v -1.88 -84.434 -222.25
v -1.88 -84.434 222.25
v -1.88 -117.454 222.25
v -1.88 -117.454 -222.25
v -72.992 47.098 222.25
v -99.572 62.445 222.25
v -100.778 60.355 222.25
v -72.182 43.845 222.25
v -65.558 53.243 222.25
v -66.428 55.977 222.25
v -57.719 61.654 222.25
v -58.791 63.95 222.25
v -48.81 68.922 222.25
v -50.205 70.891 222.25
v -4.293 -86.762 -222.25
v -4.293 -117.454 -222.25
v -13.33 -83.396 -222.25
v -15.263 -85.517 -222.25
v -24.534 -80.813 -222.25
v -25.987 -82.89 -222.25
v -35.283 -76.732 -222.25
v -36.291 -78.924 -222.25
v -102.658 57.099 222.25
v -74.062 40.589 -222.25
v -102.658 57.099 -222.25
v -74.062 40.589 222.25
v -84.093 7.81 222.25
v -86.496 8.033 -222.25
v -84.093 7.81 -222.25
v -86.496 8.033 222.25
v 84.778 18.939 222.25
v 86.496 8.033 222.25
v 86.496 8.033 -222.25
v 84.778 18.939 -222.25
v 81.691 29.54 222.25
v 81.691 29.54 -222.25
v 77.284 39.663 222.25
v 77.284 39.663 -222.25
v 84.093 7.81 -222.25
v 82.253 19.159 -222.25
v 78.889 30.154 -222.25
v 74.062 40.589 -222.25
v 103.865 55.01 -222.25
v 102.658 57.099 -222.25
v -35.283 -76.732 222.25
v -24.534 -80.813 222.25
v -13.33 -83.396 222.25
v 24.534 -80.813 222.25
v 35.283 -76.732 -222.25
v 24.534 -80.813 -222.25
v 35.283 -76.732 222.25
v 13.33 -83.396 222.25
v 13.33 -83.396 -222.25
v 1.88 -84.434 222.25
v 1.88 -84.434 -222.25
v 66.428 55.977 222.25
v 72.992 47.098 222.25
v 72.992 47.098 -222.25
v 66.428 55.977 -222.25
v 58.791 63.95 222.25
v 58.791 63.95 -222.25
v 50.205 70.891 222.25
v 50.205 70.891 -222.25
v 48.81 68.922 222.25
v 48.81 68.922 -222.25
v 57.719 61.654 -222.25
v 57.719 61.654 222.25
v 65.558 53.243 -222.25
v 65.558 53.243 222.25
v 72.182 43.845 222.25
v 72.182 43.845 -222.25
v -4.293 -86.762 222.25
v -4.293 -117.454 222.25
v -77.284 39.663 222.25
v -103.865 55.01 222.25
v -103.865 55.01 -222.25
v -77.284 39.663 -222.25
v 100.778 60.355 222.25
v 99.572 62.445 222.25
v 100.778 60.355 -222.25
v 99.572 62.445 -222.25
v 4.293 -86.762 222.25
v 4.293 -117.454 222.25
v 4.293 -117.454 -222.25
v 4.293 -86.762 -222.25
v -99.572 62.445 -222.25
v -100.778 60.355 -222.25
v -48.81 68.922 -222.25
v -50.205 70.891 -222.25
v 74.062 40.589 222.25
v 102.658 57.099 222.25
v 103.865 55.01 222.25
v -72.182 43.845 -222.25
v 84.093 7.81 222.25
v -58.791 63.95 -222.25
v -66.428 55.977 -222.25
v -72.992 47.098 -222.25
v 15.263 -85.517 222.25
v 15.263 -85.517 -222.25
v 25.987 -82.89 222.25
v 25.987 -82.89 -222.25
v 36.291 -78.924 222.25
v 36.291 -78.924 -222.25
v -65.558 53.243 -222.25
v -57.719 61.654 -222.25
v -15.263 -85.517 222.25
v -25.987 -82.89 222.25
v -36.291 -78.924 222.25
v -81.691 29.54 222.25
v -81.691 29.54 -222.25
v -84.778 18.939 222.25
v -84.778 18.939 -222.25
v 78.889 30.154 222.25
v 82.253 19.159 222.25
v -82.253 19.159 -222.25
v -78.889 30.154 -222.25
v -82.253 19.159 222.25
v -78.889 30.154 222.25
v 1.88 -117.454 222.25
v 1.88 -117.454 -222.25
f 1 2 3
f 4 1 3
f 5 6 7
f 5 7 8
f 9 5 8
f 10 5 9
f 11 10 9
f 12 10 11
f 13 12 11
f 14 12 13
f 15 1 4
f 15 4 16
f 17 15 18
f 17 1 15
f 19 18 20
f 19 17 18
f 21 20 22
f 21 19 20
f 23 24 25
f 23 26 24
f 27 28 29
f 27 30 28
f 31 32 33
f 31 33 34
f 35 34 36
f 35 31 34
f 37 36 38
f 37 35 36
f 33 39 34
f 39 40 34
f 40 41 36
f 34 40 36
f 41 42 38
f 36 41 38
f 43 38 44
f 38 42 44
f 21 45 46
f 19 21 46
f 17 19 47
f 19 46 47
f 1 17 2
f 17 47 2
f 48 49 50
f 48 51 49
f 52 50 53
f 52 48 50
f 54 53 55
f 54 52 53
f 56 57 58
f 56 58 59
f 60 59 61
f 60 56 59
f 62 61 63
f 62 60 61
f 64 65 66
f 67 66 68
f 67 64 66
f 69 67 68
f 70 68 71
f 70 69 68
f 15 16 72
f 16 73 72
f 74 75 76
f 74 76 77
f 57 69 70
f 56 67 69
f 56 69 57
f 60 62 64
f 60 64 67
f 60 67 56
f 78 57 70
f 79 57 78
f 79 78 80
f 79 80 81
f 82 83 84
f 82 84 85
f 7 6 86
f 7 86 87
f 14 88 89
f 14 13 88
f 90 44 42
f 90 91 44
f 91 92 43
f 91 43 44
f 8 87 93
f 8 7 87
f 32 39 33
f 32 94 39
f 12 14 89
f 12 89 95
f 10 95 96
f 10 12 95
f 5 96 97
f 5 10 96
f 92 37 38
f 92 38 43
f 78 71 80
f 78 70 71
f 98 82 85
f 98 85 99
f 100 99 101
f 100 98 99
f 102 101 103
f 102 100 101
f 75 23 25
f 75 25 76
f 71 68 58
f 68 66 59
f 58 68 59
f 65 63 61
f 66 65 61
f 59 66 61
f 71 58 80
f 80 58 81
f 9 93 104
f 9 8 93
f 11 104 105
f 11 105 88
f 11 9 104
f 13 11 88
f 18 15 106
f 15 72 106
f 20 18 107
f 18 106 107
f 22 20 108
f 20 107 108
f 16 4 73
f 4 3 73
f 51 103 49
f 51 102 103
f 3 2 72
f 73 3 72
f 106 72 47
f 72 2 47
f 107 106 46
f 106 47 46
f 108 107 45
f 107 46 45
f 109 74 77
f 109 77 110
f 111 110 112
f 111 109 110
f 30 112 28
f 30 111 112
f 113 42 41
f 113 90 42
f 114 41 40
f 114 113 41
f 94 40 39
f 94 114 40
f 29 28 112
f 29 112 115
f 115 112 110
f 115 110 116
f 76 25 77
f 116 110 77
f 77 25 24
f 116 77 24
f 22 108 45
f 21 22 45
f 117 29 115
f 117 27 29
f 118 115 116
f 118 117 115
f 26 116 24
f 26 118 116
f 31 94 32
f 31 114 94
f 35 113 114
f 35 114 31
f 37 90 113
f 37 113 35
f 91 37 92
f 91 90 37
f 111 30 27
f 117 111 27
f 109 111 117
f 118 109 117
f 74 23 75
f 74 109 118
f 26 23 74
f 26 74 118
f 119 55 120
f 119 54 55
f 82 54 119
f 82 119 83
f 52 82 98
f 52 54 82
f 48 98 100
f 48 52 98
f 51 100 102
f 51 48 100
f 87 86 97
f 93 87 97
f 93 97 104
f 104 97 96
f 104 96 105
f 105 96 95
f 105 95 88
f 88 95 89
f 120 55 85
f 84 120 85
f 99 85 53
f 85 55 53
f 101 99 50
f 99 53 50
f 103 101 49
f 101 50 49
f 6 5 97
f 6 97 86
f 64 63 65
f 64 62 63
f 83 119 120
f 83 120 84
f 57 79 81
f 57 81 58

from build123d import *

# Parameters (mm, degrees)
BOSS_EXTRUDE1_DEPTH   = 222.25
BOSS_EXTRUDE1_2_DEPTH = 222.25
BOSS_EXTRUDE1_3_DEPTH = 222.25
BOSS_EXTRUDE1_4_DEPTH = 222.25
BOSS_EXTRUDE1_5_DEPTH = 222.25
BOSS_EXTRUDE1_6_DEPTH = 222.25


with BuildPart() as part:
    # Sketch1 → Boss-Extrude1 (new, symmetric)
    with BuildSketch(Plane.XY):
        with BuildLine():
            Line((-1.8796, -84.43408156), (-1.8796, -117.45408156))
            Line((-1.8796, -117.45408156), (-4.2926, -117.45408156))
            Line((-4.2926, -117.45408156), (-4.2926, -86.761875321))
            ThreePointArc((-4.2926, -86.761875321), (-20.666871058, -84.373751041), (-36.291213239, -78.923996767))
            Line((-36.291213239, -78.923996767), (-35.283123983, -76.731663523))
            ThreePointArc((-35.283123983, -76.731663523), (-18.976270033, -82.295493198), (-1.8796, -84.43408156))
        make_face()
    extrude(amount=BOSS_EXTRUDE1_DEPTH, both=True)


with BuildPart() as body_2:
    # Sketch1 → Boss-Extrude1 2 (new, symmetric)
    with BuildSketch(Plane.XY):
        with BuildLine():
            Line((1.8796, -84.43408156), (1.8796, -117.45408156))
            Line((1.8796, -117.45408156), (4.2926, -117.45408156))
            Line((4.2926, -117.45408156), (4.2926, -86.761875321))
            ThreePointArc((4.2926, -86.761875321), (20.666871058, -84.373751041), (36.291213239, -78.923996767))
            Line((36.291213239, -78.923996767), (35.283123983, -76.731663523))
            ThreePointArc((35.283123983, -76.731663523), (18.976270033, -82.295493198), (1.8796, -84.43408156))
        make_face()
    extrude(amount=BOSS_EXTRUDE1_2_DEPTH, both=True)


with BuildPart() as body_3:
    # Sketch1 → Boss-Extrude1 3 (new, symmetric)
    with BuildSketch(Plane.XY):
        with BuildLine():
            Line((-48.810007894, 68.921913455), (-50.204579548, 70.891110983))
            ThreePointArc((-50.204579548, 70.891110983), (-62.736376285, 60.084910873), (-72.991688108, 47.098438309))
            Line((-72.991688108, 47.098438309), (-99.571918409, 62.444541428))
            Line((-99.571918409, 62.444541428), (-100.778418409, 60.354822129))
            Line((-100.778418409, 60.354822129), (-72.182259576, 43.844822129))
            ThreePointArc((-72.182259576, 43.844822129), (-61.78185271, 57.581678516), (-48.810007894, 68.921913455))
        make_face()
    extrude(amount=BOSS_EXTRUDE1_3_DEPTH, both=True)


with BuildPart() as body_4:
    # Sketch1 → Boss-Extrude1 4 (new, symmetric)
    with BuildSketch(Plane.XY):
        with BuildLine():
            Line((-74.061859576, 40.589259431), (-102.658018409, 57.099259431))
            Line((-102.658018409, 57.099259431), (-103.864518409, 55.009540132))
            Line((-103.864518409, 55.009540132), (-77.284288108, 39.663437012))
            ThreePointArc((-77.284288108, 39.663437012), (-83.403247343, 24.288840168), (-86.495792788, 8.032885784))
            Line((-86.495792788, 8.032885784), (-84.093131877, 7.809750068))
            ThreePointArc((-84.093131877, 7.809750068), (-80.758122743, 24.713814681), (-74.061859576, 40.589259431))
        make_face()
    extrude(amount=BOSS_EXTRUDE1_4_DEPTH, both=True)


with BuildPart() as body_5:
    # Sketch1 → Boss-Extrude1 5 (new, symmetric)
    with BuildSketch(Plane.XY):
        with BuildLine():
            Line((84.093131877, 7.809750068), (86.495792788, 8.032885784))
            ThreePointArc((86.495792788, 8.032885784), (83.403247343, 24.288840168), (77.284288108, 39.663437012))
            Line((77.284288108, 39.663437012), (103.864518409, 55.009540132))
            Line((103.864518409, 55.009540132), (102.658018409, 57.099259431))
            Line((102.658018409, 57.099259431), (74.061859576, 40.589259431))
            ThreePointArc((74.061859576, 40.589259431), (80.758122743, 24.713814681), (84.093131877, 7.809750068))
        make_face()
    extrude(amount=BOSS_EXTRUDE1_5_DEPTH, both=True)


with BuildPart() as body_6:
    # Sketch1 → Boss-Extrude1 6 (new, symmetric)
    with BuildSketch(Plane.XY):
        with BuildLine():
            Line((72.182259576, 43.844822129), (100.778418409, 60.354822129))
            Line((100.778418409, 60.354822129), (99.571918409, 62.444541428))
            Line((99.571918409, 62.444541428), (72.991688108, 47.098438309))
            ThreePointArc((72.991688108, 47.098438309), (62.736376285, 60.084910873), (50.204579548, 70.891110983))
            Line((50.204579548, 70.891110983), (48.810007894, 68.921913455))
            ThreePointArc((48.810007894, 68.921913455), (61.78185271, 57.581678516), (72.182259576, 43.844822129))
        make_face()
    extrude(amount=BOSS_EXTRUDE1_6_DEPTH, both=True)


solid = Compound([part.part, body_2.part, body_3.part, body_4.part, body_5.part, body_6.part])
